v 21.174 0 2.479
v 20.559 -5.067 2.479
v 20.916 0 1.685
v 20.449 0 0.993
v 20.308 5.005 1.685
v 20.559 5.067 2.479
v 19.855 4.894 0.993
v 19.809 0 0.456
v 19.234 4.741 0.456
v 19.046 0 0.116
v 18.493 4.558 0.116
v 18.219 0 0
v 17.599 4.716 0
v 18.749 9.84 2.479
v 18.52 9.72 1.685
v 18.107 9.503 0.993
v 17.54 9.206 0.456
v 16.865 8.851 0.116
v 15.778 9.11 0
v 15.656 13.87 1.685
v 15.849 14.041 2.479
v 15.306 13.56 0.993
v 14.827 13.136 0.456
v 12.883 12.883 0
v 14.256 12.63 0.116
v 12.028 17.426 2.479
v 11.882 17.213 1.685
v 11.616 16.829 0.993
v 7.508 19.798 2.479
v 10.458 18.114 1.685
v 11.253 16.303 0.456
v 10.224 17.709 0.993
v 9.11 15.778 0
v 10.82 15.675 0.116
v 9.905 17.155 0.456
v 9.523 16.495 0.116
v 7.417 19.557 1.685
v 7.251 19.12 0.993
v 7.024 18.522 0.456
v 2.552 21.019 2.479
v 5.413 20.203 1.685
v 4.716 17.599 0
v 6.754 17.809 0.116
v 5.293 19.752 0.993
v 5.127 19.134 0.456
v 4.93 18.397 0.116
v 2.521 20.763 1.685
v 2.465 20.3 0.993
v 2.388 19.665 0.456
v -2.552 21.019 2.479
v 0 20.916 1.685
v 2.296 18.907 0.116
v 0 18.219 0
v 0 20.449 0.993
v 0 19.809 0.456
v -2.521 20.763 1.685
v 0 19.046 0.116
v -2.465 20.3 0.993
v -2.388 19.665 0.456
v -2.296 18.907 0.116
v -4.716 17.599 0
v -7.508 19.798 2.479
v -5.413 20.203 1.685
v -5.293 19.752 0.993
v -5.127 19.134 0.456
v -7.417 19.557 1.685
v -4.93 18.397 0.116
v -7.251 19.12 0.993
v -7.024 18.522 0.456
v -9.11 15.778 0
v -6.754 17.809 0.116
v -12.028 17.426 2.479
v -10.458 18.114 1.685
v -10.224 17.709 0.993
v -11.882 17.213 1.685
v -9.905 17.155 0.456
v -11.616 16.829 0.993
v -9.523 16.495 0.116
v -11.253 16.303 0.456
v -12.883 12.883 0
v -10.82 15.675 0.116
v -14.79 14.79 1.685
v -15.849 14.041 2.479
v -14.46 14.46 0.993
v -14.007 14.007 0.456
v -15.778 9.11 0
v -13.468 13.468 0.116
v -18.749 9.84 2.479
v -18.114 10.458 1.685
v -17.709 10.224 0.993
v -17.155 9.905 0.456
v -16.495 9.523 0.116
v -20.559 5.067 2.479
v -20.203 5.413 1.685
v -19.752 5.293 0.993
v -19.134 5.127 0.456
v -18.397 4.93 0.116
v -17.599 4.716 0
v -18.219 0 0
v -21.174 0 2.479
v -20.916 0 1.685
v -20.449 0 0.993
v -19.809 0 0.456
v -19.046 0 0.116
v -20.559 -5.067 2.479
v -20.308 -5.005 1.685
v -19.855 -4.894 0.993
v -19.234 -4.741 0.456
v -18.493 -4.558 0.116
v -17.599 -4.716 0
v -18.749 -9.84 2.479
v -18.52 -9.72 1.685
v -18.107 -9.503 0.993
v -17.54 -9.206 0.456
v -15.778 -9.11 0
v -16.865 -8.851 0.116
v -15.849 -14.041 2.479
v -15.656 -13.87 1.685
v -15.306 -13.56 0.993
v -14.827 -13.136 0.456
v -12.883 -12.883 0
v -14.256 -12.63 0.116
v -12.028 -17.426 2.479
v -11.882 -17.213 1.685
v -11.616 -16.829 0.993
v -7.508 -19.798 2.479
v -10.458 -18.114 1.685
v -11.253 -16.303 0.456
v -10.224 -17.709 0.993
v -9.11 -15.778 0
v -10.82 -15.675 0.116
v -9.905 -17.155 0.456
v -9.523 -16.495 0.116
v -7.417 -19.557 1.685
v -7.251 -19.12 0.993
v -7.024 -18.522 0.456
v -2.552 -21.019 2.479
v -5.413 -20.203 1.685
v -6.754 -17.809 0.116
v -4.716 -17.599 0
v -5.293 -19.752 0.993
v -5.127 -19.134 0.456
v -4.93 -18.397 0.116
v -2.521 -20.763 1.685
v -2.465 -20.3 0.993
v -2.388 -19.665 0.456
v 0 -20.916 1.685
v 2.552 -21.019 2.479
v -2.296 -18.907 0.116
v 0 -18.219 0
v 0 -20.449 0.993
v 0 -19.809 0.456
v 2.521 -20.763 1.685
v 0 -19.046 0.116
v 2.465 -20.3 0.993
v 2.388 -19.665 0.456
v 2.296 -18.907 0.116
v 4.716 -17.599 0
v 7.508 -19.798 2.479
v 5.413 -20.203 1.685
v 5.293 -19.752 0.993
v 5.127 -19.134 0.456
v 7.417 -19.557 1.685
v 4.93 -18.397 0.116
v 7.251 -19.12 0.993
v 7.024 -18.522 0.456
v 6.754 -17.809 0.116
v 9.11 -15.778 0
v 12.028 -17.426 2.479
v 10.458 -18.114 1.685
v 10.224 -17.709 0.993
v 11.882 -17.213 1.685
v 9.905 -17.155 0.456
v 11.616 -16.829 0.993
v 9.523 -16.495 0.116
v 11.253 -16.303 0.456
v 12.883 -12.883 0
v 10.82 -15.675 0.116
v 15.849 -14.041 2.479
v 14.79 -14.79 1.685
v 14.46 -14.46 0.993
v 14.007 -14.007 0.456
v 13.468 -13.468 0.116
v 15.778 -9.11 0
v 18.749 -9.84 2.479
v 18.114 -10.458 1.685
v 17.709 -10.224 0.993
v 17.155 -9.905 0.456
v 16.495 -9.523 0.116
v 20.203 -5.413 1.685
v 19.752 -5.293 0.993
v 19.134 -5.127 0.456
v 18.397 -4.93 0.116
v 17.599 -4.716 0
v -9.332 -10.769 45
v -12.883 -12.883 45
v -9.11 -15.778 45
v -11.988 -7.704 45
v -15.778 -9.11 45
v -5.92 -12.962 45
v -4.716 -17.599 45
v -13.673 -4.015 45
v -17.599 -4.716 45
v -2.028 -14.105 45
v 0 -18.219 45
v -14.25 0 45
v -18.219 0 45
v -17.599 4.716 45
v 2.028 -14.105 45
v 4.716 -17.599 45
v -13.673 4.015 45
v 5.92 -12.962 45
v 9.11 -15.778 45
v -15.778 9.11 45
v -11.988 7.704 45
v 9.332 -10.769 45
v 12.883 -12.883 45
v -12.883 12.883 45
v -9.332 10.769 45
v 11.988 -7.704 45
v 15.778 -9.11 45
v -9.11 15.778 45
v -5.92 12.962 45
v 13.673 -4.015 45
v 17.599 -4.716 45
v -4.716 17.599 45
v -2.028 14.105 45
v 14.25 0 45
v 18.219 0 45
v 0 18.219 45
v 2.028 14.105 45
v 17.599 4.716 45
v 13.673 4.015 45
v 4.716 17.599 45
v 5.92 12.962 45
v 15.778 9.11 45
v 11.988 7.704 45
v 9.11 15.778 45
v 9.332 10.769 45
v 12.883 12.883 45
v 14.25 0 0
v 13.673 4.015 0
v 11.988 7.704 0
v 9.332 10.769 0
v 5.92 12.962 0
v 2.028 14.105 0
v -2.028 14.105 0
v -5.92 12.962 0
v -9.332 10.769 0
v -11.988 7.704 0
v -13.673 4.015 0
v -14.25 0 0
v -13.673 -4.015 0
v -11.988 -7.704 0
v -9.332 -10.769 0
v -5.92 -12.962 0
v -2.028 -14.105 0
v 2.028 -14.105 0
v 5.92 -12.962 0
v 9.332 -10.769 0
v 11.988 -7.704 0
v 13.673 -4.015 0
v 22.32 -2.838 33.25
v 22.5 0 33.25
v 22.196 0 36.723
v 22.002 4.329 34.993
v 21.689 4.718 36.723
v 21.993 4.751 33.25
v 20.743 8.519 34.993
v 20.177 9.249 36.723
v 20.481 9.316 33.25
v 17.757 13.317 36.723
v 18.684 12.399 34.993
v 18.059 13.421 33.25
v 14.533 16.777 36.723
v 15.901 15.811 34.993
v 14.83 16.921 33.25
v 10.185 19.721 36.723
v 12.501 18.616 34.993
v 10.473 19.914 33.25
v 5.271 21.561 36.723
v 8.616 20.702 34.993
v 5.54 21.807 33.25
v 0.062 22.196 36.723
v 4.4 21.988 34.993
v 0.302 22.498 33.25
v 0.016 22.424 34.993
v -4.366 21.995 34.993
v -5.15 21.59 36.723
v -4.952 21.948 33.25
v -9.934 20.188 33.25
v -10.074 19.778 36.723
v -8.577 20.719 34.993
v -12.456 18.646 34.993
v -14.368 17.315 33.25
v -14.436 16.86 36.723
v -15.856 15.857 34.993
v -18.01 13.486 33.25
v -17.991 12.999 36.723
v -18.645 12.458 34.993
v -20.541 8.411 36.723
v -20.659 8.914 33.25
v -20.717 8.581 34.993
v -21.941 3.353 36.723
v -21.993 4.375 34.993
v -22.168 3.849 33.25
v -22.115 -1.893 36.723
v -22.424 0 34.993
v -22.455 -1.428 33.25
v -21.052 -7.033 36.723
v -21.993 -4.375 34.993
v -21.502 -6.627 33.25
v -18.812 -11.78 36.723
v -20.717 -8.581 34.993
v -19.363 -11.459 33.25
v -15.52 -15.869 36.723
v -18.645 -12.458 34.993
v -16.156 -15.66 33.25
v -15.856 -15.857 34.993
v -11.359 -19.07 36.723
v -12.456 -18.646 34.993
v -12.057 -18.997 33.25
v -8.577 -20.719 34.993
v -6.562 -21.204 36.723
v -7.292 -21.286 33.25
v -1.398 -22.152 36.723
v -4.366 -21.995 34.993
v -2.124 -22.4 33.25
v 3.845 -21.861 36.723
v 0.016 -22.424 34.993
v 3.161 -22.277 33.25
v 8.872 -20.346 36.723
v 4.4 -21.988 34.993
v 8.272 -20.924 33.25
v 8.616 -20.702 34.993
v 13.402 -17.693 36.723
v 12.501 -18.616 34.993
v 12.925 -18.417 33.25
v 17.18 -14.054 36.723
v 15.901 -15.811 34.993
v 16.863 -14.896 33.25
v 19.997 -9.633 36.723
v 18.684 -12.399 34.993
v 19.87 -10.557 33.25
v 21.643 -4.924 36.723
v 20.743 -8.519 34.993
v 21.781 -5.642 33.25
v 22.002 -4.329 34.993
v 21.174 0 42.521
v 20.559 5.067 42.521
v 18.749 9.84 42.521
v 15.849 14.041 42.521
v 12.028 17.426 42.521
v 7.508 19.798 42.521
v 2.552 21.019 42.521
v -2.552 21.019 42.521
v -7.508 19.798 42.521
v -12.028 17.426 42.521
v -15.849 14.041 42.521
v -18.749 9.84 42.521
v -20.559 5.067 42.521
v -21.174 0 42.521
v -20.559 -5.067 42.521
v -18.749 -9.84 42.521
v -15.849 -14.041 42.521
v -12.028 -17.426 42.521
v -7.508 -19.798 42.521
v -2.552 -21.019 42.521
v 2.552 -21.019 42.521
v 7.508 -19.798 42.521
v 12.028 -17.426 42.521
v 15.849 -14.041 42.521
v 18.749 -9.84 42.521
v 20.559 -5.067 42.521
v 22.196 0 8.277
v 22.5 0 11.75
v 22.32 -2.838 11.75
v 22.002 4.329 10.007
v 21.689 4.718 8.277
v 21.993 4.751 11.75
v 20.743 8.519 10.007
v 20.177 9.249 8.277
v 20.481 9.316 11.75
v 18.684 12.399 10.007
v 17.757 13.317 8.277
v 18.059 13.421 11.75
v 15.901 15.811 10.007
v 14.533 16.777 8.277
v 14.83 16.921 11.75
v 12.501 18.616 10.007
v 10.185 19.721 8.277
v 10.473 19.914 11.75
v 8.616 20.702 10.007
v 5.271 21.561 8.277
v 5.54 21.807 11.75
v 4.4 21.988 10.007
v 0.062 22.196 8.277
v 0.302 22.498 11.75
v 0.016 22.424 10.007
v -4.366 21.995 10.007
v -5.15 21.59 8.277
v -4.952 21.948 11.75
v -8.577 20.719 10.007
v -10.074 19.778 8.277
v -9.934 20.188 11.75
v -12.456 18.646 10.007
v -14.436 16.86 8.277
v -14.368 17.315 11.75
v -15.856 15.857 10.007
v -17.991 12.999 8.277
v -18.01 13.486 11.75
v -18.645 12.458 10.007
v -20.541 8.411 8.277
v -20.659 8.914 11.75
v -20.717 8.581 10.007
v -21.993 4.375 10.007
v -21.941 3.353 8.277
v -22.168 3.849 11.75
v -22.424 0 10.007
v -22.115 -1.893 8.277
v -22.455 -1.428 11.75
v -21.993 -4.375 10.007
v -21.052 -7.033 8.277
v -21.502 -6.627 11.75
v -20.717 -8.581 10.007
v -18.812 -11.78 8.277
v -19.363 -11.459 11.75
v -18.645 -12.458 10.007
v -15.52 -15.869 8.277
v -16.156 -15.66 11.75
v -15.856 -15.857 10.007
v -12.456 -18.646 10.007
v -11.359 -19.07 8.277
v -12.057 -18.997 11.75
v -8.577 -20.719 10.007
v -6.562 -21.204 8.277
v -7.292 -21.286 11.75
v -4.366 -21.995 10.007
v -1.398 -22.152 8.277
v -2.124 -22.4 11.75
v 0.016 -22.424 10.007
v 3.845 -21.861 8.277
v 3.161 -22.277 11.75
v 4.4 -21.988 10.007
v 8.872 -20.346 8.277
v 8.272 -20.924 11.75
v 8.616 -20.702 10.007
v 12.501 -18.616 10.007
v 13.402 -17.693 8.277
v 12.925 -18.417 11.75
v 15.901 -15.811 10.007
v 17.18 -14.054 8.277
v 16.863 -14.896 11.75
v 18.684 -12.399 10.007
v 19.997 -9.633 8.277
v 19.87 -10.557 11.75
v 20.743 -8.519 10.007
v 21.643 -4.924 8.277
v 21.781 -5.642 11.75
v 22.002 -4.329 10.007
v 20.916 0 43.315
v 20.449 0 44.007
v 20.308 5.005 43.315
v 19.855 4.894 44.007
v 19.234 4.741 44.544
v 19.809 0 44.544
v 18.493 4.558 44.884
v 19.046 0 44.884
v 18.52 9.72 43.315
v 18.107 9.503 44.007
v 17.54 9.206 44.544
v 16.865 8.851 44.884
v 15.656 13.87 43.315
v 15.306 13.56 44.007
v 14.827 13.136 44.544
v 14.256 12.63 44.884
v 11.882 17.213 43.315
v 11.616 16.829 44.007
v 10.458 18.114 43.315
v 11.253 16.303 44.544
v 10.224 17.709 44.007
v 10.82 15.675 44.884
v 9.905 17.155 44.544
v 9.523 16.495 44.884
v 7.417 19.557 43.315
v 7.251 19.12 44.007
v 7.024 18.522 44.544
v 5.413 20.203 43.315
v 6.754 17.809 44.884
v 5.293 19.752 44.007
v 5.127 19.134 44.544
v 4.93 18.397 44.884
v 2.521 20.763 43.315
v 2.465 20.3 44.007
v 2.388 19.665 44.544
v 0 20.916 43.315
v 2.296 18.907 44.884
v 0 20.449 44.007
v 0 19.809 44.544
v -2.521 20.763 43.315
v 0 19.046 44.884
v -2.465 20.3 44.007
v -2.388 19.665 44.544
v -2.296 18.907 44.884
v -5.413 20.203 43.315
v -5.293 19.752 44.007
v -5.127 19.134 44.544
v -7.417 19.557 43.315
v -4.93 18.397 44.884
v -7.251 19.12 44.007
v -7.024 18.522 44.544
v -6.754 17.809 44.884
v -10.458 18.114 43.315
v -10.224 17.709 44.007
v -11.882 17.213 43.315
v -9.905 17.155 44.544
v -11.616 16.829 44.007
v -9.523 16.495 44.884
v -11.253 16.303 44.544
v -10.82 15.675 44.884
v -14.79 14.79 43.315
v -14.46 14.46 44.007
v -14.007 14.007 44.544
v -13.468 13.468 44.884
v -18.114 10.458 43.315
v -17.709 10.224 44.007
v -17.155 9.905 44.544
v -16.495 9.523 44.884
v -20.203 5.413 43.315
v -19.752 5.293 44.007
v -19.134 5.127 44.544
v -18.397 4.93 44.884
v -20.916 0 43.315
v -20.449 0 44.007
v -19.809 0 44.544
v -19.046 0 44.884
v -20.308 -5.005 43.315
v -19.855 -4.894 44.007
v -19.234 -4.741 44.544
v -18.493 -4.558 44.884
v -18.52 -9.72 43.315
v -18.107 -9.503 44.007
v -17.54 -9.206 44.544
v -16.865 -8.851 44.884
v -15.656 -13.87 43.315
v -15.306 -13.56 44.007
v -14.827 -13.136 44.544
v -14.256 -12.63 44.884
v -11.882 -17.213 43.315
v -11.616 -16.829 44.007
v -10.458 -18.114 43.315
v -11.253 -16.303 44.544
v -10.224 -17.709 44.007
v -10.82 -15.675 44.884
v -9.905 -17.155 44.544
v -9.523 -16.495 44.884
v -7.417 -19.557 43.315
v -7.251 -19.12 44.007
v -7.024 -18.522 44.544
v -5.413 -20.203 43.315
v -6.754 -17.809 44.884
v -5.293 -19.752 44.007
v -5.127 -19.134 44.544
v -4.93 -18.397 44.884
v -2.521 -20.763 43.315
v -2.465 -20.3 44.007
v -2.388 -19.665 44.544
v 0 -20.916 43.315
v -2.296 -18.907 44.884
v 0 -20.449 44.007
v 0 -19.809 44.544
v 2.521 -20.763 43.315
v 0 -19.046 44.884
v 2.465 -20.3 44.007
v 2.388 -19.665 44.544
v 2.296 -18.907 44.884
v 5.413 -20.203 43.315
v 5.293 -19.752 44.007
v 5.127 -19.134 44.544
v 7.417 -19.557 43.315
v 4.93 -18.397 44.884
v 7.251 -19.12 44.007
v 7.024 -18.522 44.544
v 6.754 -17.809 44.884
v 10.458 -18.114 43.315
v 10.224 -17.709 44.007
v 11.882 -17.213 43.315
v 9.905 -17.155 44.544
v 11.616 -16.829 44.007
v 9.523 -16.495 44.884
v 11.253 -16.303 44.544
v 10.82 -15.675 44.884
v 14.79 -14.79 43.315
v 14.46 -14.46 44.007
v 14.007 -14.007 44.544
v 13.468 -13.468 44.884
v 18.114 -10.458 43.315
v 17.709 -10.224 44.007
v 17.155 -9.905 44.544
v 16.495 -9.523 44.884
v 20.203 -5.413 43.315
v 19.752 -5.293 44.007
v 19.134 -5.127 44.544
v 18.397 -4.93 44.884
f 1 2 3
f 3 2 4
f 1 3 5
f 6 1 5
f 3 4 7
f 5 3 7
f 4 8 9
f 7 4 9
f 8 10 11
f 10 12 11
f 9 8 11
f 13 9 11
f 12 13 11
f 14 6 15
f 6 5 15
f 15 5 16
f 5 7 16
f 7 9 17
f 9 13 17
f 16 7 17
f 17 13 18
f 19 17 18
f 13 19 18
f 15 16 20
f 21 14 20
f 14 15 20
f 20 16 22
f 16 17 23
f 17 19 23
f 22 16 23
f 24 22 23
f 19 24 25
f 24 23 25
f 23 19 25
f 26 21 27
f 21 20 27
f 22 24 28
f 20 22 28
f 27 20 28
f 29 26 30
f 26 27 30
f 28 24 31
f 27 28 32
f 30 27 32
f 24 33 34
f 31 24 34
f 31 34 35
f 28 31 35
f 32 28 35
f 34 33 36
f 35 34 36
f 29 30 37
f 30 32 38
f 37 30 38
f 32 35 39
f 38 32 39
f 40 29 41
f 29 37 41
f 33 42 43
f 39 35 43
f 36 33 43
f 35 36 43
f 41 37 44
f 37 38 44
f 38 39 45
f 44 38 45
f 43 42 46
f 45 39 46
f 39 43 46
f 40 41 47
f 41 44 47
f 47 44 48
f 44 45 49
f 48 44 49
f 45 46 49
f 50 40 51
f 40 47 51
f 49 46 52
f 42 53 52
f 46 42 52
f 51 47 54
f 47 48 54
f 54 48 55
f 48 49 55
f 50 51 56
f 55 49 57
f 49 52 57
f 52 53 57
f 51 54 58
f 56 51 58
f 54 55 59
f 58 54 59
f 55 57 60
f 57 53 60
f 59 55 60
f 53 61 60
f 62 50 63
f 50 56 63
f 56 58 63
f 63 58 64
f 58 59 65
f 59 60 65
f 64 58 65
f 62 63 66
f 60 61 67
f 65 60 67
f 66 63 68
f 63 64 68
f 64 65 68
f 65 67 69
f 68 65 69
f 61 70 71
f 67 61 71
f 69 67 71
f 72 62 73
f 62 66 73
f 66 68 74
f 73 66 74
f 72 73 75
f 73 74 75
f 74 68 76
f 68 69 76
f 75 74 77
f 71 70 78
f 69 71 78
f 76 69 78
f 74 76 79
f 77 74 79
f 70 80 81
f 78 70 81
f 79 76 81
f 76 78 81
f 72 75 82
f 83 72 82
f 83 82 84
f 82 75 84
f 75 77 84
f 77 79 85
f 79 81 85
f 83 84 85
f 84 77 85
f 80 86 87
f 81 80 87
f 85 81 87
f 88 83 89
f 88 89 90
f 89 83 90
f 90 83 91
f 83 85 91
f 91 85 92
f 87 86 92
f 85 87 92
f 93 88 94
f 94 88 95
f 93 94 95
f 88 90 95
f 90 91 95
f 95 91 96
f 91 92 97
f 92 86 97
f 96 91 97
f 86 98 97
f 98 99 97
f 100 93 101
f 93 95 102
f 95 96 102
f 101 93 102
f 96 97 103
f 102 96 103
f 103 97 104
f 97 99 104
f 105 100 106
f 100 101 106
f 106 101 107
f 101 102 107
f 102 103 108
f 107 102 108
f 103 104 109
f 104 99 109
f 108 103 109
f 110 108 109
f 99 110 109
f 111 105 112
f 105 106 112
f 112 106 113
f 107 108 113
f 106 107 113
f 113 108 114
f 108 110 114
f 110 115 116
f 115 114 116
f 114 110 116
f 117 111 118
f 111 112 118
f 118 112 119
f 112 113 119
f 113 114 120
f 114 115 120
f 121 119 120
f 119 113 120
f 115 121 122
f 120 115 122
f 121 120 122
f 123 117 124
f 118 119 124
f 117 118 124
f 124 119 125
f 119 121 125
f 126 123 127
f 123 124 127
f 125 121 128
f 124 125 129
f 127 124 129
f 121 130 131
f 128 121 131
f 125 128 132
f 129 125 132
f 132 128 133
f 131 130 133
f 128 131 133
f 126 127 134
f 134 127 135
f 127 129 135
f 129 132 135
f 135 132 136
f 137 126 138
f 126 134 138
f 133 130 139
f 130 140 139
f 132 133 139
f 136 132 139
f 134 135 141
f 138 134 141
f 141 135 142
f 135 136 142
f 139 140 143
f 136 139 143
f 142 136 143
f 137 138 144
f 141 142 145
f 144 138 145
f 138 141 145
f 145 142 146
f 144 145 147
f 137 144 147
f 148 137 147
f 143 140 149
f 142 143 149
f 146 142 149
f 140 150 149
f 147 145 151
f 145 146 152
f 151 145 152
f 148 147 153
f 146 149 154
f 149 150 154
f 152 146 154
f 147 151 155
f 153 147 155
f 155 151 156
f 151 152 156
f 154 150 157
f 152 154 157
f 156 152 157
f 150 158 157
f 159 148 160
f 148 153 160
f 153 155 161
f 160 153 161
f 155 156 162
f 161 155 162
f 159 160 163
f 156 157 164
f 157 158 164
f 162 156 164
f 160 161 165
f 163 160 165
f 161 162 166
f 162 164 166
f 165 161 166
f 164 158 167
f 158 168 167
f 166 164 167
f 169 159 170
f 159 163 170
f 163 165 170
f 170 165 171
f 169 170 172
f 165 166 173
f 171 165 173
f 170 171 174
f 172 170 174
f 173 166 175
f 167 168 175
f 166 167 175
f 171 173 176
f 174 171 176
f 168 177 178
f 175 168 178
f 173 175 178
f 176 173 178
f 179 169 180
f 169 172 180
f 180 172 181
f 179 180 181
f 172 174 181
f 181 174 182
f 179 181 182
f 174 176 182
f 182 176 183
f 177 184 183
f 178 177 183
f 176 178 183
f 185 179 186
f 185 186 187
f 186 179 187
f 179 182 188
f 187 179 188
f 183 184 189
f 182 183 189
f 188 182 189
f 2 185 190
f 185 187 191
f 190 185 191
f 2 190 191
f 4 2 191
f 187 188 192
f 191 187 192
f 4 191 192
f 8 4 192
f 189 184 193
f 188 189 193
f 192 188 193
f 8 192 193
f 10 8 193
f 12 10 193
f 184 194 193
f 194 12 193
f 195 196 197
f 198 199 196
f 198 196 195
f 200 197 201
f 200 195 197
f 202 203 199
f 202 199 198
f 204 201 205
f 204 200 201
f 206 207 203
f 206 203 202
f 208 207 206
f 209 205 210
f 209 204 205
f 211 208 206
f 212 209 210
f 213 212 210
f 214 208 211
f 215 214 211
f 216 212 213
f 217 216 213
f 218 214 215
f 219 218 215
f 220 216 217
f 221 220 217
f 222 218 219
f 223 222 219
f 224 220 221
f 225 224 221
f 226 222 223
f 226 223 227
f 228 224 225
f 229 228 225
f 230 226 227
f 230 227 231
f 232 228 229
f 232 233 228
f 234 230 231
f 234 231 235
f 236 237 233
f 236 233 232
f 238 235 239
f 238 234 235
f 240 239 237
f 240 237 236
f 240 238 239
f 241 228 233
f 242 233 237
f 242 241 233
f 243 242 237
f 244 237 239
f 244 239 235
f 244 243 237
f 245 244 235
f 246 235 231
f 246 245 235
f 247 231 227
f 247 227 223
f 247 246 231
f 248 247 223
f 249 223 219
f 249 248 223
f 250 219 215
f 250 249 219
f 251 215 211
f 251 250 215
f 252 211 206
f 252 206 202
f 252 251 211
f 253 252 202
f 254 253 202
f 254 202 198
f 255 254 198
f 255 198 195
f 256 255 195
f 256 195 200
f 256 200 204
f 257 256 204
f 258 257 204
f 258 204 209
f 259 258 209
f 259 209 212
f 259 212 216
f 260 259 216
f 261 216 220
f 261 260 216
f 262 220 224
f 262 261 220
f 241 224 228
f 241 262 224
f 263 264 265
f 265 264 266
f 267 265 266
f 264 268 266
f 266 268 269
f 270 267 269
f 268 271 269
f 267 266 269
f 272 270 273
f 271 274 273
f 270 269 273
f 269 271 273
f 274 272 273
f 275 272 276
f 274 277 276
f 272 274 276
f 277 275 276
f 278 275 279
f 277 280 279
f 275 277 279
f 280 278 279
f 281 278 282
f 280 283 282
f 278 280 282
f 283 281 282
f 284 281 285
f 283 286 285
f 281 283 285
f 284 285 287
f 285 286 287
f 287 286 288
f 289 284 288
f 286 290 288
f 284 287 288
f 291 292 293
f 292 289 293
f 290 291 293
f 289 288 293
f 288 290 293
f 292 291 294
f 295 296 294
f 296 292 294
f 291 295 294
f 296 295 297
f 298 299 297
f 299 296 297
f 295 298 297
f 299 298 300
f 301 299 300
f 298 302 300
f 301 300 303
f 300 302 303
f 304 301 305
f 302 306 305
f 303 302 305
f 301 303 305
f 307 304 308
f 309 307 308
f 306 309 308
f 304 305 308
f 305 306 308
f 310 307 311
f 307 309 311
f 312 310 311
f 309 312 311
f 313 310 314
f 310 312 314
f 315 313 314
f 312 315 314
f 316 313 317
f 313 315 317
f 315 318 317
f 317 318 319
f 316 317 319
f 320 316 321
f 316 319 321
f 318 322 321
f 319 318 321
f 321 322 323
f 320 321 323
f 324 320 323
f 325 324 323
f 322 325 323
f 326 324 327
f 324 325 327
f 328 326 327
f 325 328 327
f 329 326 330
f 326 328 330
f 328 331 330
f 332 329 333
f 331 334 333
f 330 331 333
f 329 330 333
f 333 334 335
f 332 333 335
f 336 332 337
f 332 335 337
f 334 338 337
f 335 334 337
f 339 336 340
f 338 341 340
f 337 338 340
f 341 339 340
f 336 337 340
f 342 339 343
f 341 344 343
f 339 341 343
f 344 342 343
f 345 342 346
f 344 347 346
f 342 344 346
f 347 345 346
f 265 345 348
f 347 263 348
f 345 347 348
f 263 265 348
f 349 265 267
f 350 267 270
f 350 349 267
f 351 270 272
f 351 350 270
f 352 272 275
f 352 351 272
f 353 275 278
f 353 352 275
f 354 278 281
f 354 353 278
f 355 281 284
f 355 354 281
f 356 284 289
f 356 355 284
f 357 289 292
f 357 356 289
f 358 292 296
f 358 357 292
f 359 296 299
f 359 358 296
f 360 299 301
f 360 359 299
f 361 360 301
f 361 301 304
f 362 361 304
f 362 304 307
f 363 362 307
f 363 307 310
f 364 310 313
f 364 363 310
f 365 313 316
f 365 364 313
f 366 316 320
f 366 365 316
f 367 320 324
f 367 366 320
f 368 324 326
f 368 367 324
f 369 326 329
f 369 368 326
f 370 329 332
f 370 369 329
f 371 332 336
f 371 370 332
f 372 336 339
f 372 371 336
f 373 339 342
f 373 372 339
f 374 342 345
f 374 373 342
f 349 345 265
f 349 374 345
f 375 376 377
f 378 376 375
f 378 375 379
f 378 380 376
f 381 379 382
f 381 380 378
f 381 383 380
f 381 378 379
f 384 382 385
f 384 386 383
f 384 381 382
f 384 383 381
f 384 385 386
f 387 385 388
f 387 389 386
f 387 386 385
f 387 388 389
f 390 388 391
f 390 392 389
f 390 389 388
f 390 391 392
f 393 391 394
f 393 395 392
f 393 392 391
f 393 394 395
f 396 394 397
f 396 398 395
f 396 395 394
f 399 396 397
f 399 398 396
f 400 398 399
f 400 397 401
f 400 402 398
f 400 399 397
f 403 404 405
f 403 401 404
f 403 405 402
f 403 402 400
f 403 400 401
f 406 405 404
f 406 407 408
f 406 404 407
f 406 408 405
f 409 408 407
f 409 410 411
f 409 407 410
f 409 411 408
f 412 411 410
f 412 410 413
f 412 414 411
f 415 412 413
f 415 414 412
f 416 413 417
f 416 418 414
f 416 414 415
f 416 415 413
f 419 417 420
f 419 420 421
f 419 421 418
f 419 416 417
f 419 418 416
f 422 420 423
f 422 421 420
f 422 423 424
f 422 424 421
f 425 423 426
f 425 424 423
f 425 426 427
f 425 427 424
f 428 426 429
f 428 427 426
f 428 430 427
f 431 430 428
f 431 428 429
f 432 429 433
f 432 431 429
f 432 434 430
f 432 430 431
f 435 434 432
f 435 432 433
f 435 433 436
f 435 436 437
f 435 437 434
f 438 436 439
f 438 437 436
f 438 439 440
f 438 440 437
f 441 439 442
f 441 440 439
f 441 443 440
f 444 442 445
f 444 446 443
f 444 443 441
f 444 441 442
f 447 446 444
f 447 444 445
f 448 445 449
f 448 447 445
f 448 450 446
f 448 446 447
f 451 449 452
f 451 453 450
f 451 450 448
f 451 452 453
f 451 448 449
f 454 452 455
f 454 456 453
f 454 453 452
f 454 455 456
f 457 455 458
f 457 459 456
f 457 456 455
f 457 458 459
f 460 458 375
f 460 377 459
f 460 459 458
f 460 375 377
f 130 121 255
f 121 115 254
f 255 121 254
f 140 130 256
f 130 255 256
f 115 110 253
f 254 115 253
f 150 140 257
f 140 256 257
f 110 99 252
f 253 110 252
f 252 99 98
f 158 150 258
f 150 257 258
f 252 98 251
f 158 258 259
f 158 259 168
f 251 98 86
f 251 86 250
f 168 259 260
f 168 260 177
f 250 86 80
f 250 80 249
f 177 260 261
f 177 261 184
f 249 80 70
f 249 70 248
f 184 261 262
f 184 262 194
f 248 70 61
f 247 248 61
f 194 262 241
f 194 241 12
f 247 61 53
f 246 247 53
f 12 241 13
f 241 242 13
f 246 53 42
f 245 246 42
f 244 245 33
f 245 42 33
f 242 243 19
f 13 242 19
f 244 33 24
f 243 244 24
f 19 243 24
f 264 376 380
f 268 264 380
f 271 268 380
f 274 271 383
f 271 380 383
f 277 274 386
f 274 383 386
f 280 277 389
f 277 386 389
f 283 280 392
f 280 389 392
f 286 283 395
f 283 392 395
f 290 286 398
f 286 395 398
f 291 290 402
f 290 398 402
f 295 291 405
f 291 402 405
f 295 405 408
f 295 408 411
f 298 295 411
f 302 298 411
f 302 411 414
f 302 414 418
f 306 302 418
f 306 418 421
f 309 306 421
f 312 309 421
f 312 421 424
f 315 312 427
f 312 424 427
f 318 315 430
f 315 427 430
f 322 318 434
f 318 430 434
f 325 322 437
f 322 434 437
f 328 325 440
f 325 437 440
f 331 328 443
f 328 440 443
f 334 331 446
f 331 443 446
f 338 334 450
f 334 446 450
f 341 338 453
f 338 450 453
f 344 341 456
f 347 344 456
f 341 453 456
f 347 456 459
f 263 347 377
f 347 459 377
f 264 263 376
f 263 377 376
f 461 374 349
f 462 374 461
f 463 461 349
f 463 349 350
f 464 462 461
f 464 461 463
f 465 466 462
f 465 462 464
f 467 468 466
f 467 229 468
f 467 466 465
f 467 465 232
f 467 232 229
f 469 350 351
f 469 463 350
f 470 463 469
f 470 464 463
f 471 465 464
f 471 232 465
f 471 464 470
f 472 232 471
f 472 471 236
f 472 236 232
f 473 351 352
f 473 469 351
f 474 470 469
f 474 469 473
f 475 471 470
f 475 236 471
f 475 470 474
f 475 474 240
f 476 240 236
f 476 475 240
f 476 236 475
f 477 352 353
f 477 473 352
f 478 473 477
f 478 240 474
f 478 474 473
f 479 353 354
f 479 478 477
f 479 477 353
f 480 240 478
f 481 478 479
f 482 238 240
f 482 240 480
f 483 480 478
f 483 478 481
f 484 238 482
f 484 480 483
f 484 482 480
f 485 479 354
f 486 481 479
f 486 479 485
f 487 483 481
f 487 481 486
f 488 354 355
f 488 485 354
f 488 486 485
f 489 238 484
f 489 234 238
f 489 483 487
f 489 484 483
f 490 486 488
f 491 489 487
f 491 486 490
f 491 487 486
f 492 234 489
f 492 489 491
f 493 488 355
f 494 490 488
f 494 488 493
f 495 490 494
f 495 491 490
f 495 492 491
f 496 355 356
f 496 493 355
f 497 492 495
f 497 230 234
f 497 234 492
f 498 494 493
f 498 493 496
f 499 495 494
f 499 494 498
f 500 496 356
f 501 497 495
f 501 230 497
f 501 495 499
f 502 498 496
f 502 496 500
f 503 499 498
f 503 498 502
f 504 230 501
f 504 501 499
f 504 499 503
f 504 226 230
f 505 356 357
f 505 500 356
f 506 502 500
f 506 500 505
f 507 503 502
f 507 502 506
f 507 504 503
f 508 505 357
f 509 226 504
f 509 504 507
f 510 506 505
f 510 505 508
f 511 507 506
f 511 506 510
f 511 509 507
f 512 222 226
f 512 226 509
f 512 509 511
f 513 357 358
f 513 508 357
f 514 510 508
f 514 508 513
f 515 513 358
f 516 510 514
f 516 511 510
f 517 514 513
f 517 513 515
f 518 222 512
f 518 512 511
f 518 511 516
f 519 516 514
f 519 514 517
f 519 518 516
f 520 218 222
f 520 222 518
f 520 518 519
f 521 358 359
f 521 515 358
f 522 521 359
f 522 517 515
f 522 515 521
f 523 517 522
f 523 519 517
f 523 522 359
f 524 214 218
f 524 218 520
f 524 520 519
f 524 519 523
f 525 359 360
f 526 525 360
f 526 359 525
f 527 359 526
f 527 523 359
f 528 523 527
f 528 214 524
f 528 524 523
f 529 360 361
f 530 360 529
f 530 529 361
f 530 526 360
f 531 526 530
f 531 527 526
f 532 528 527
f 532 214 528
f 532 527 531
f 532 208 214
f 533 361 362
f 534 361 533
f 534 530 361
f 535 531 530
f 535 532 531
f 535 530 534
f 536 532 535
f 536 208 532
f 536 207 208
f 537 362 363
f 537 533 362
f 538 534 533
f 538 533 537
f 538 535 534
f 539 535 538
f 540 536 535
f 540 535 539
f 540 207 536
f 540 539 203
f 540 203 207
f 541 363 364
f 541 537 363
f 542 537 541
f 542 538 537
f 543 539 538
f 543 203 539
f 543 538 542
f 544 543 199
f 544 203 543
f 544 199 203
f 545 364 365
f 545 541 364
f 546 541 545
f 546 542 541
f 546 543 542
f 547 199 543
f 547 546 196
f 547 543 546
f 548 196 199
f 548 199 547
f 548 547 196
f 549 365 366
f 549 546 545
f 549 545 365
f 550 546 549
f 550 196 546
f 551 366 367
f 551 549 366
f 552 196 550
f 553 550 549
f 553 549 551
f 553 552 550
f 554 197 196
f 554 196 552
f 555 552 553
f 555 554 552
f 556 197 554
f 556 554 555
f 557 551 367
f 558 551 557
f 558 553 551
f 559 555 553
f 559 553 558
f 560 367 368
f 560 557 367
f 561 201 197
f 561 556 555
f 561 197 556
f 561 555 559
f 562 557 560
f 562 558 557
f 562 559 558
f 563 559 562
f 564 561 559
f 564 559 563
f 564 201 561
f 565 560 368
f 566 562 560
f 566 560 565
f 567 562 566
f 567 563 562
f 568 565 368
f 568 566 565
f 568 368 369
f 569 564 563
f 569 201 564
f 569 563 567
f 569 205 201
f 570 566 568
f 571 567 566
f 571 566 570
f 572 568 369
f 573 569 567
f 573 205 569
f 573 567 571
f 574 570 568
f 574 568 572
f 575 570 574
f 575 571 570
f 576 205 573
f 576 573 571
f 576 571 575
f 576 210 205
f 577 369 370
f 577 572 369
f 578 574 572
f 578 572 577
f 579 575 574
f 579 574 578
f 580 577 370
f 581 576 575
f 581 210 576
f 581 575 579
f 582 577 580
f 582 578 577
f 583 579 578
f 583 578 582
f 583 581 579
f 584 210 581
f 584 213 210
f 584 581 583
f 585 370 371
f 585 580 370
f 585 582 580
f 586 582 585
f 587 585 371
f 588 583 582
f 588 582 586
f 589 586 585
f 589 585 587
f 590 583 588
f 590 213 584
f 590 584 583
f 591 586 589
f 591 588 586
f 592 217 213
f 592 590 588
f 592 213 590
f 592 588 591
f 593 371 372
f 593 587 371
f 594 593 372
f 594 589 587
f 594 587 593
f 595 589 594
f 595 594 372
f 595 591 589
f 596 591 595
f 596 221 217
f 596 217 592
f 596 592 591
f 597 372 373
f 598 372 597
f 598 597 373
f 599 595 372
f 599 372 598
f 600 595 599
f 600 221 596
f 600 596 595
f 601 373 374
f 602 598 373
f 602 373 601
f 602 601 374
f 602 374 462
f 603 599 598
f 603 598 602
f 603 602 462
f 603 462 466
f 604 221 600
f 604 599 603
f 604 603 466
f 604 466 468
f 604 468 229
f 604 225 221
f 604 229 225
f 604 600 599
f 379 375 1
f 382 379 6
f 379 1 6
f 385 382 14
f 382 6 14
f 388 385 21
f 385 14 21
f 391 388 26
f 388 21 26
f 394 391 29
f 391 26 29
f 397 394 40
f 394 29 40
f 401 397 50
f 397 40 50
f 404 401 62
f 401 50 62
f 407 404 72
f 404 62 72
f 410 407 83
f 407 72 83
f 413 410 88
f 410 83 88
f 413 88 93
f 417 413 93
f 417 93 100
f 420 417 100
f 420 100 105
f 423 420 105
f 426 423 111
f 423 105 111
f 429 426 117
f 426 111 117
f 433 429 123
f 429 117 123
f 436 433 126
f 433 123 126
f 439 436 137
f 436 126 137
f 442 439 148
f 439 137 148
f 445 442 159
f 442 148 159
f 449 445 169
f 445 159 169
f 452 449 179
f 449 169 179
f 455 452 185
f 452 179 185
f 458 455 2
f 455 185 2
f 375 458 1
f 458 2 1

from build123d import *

# Parameters (mm, degrees)
F0_R     = 22.5
F0_R_2   = 14.25
F1_DEPTH = 45
F2_SIZE2 = 1.7632698071
F2_SIZE  = 10
F3_R     = 20
F4_R     = 3


with BuildPart() as f1:
    # F0 (on Top) → F1 (new body)
    with BuildSketch(Plane.XY):
        Circle(F0_R)
        Circle(F0_R_2, mode=Mode.SUBTRACT)
    extrude(amount=F1_DEPTH)

    # F2
    f2_edges = [f1.edges().sort_by_distance(p)[0] for p in [
        (-22.5, 0, 0),
        (-22.5, 0, 45),
    ]]
    f2_side = f1.faces().sort_by_distance((-22.5, 0, 22.5))[0]
    chamfer(f2_edges, length=F2_SIZE, length2=F2_SIZE2, reference=f2_side)

    # F3
    f3_edges = [f1.edges().sort_by_distance(p)[0] for p in [
        (22.5, 0, 22.5),
        (-22.5, 0, 10),
        (-22.5, 0, 35),
    ]]
    fillet(f3_edges, radius=F3_R)

    # F4
    f4_edges = [f1.edges().sort_by_distance(p)[0] for p in [
        (-20.73673, 0, 45),
        (-20.73673, 0, 0),
    ]]
    fillet(f4_edges, radius=F4_R)


solid = f1.part
